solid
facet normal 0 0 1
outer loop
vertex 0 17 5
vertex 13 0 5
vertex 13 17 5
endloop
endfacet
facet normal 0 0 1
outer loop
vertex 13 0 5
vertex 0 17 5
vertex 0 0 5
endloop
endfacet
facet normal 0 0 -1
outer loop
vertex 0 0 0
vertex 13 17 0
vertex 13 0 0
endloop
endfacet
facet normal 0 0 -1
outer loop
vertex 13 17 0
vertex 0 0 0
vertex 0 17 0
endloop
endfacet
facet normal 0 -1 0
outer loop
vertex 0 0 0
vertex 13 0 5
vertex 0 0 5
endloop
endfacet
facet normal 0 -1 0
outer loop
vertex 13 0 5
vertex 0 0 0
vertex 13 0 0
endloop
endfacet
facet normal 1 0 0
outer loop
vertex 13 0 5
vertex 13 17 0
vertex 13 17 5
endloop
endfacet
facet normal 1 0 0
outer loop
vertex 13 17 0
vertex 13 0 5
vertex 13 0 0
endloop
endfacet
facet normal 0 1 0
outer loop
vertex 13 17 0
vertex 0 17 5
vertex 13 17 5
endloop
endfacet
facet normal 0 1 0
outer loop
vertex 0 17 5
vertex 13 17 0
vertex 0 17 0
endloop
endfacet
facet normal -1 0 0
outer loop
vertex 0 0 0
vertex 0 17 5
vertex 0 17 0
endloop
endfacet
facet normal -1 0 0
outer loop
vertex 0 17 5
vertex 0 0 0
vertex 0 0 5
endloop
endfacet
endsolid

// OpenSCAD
// Generated by SolidPython 1.0.1 on 2020-07-29 00:46:55


cube(size = [13, 17, 5]);
/***********************************************
*********      SolidPython code:      **********
************************************************
 
# import packages: SolidPython
from solid import *
from solid.utils import *
from itertools import chain, combinations, permutations


class Resize:

    def __init__(self, scad_file):
        self.scad_file = scad_file
        #self.scad_file = import_scad(scad_file)
        # cone/cylinder param:
        self.r1 = 0
        self.r2 = 0
        self.h = 0
        # rectangular prism param:
        self.w = 0
        self.l = 0
        # ellipse param:
        self.r = 0

    # import OpenScad code (file name corresponds to shape)


    # classify shape + parameters
    def assign(self, param1, param2, param3):
        if self.scad_file == 'cone.scad':
            self.r1 = param1
            self.r2 = param2
            self.h = param3
        elif self.scad_file == 'cylinder.scad':
            self.r1 = param1
            self.r2 = param2
            self.h = param3
        elif self.scad_file == 'rectangularPrism.scad':
            self.h = param1
            self.l = param2
            self.w = param3
        else:
            self.r = param1
            self.h = param2

    # resize parameters
    def iterate(self):
        x = range(3, 20, 2)
        i = 1
        if self.scad_file == 'cone.scad':
            tempList = list(permutations(x, 2))
            for temp in tempList:
                param1 = temp[0]
                param2 = temp[1]
                filepath = 'produced_scad_files/' + 'cone' + str(param1) + '_' + str(param2) + '_' + '.scad'
                scad_render_to_file(cylinder(h=param1, r1=param2, r2=0), filepath)

        elif self.scad_file == 'cylinder.scad':
            tempList = list(permutations(x, 3))
            for temp in tempList:
                param1 = temp[0]
                param2 = temp[1]
                filepath = 'produced_scad_files/' + 'cylinder' + str(param1) + '_' + str(param2) + '_' + '.scad'
                scad_render_to_file(cylinder(h=param1, r1=param2, r2=param2), filepath)

        elif self.scad_file == 'rectangularPrism.scad':
            tempList = list(permutations(x, 3))
            for temp in tempList:
                param1 = temp[0]
                param2 = temp[1]
                param3 = temp[2]
                filepath = 'produced_scad_files/' + 'rectangularPrism' + str(param1) + '_' + str(param2) + '_' + str(
                    param3) + '.scad'
                scad_render_to_file(cube(size=(param1, param2, param3)), filepath)

        elif self.scad_file == 'ellipse.scad':
            tempList = list(permutations(x, 4))
            for temp in tempList:
                param1 = temp[0]
                param2 = temp[1]
                param3 = temp[2]
                param4 = temp[3]
                filepath = 'produced_scad_files/' + 'ellipse' + str(param1) + '_' + str(param2) + '_' + str(param3) + '_' + str(param4) + '.scad'
                scad_render_to_file(scale([param1, param2, param3])(sphere(r=param4)), filepath)

    def render_to_scadfile(self):
        scad_render_to_file(scad, 'example.scad') 
 
************************************************/
